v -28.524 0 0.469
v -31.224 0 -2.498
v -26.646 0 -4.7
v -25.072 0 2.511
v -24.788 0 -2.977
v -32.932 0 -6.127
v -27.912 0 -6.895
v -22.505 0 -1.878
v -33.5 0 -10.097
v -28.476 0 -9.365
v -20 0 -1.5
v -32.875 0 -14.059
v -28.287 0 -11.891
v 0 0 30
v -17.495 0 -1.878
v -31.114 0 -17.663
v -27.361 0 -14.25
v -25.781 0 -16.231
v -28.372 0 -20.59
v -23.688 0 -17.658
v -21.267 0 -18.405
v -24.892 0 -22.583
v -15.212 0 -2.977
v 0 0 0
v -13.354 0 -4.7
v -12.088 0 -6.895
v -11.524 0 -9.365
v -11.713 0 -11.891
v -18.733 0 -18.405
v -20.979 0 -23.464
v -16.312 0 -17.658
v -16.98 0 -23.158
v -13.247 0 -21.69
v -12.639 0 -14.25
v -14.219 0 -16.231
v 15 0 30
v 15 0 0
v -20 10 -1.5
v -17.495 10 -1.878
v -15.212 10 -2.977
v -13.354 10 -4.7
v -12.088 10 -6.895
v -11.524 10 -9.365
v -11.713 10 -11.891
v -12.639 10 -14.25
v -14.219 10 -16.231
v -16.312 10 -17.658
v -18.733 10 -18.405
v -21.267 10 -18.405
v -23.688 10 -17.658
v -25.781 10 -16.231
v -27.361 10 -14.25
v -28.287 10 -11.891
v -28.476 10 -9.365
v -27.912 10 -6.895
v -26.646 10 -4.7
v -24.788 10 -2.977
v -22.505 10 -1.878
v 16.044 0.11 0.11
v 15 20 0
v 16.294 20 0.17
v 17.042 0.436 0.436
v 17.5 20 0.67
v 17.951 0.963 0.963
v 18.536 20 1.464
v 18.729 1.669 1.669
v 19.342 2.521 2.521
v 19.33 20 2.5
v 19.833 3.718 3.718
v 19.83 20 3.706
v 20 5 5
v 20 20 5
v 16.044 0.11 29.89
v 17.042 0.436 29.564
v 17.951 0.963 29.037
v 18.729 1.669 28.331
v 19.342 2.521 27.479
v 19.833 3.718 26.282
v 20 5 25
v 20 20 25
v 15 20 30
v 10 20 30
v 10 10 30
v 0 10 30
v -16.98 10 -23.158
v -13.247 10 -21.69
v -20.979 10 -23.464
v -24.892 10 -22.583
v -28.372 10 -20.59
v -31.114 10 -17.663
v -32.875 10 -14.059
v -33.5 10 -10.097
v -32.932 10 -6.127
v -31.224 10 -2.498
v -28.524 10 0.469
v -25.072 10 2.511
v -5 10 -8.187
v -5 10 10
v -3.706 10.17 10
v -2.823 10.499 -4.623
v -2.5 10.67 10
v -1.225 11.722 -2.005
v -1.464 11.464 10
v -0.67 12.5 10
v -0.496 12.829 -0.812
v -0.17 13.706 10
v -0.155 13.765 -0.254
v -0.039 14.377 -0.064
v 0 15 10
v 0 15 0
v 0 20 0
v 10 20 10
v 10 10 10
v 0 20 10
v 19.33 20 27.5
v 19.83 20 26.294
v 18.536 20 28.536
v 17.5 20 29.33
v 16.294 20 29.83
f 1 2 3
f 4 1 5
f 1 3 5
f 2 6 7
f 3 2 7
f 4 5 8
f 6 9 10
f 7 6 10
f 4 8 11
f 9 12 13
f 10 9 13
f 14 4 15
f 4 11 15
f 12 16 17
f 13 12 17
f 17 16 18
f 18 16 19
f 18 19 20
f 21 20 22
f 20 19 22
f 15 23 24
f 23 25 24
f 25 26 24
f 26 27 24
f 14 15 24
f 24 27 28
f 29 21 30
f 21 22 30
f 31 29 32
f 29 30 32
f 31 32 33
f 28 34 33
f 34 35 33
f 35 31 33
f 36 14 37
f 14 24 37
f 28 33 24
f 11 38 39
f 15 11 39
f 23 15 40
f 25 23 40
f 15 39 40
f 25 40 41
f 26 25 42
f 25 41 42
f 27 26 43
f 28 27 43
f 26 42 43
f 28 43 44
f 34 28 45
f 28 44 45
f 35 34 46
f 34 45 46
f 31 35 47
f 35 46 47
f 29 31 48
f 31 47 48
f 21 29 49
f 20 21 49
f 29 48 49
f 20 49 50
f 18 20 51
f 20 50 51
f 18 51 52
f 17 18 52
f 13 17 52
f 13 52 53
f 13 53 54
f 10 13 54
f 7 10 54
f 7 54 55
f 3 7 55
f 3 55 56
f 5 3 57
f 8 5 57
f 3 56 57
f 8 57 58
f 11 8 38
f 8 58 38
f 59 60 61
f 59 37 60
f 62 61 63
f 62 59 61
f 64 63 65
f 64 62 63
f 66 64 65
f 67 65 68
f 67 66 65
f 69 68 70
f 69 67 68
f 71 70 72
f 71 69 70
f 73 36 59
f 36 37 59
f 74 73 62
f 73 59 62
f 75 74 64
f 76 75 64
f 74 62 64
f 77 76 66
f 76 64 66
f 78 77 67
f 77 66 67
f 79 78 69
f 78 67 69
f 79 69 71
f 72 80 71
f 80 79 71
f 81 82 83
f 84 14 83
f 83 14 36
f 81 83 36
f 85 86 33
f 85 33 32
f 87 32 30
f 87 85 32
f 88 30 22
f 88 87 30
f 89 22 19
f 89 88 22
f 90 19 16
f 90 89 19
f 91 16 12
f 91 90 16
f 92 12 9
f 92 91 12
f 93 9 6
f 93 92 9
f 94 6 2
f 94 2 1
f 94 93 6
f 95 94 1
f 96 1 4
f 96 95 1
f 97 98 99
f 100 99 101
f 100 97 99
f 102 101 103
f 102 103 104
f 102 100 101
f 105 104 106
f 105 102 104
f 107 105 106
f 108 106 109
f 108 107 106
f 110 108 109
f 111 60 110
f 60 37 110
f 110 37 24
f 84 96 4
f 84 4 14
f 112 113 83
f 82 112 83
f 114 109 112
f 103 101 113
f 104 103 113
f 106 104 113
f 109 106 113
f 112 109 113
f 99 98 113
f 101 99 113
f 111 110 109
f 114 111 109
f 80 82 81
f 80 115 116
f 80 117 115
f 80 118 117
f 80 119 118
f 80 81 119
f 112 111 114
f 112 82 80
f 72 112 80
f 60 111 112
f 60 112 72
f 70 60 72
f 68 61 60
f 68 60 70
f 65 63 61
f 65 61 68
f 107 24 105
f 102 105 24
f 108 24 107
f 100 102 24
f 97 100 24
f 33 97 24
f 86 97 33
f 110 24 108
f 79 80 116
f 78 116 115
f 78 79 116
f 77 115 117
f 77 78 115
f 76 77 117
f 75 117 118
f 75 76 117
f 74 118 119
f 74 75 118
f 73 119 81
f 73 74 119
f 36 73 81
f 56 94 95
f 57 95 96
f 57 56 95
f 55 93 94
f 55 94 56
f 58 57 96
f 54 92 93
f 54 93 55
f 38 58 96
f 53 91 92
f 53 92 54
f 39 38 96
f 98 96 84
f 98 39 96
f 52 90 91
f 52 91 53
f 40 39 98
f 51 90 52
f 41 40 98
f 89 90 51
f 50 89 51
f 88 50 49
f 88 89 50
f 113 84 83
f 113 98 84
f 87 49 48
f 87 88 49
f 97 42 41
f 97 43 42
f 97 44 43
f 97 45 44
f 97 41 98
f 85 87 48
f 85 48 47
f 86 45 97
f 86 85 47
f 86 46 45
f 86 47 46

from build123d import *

# Parameters (mm, degrees)
SKETCH1_W           = 20
SKETCH1_H           = 30
BOSS_EXTRUDE1_DEPTH = 10
BOSS_EXTRUDE2_DEPTH = 10
SKETCH4_R           = 8.5
BOSS_EXTRUDE3_DEPTH = 10
FILLET1_R           = 5


with BuildPart() as part:
    # Sketch1 → Boss-Extrude1 (new body)
    with BuildSketch(Plane(origin=(0, 0, 0), x_dir=(1, 0, 0), z_dir=(0, 1, 0))):
        with Locations((10, -15)):
            Rectangle(SKETCH1_W, SKETCH1_H)
    extrude(amount=BOSS_EXTRUDE1_DEPTH)

    # Sketch2 → Boss-Extrude2 (add)
    with BuildSketch(Plane(origin=(0, 10, 0), x_dir=(1, 0, 0), z_dir=(0, 1, 0))):
        Polygon((0, 0), (0, -10), (10, -10), (10, -30), (20, -30), (20, 0), align=None)
    extrude(amount=BOSS_EXTRUDE2_DEPTH)

    # Sketch4 → Boss-Extrude3 (add)
    with BuildSketch(Plane(origin=(0, 10, 0), x_dir=(1, 0, 0), z_dir=(0, 1, 0))):
        with BuildLine():
            Line((0, 0), (-13.247067503, 21.689649383))
            ThreePointArc((-13.247067503, 21.689649383), (-32.129444614, 15.92676753), (-25.072116083, -2.510940749))
            Line((-25.072116083, -2.510940749), (0, -30))
            Line((0, -30), (0, 0))
        make_face()
        with Locations(Location((-20, 10, 0), (0, 0, 270))):
            Circle(SKETCH4_R, mode=Mode.SUBTRACT)
    extrude(amount=-BOSS_EXTRUDE3_DEPTH)

    # Fillet1
    fillet1_edges = [part.edges().sort_by_distance(p)[0] for p in [
        (0, 10, 5),
        (20, 0, 15),
        (20, 10, 0),
        (20, 10, 30),
    ]]
    fillet(fillet1_edges, radius=FILLET1_R)


solid = part.part
